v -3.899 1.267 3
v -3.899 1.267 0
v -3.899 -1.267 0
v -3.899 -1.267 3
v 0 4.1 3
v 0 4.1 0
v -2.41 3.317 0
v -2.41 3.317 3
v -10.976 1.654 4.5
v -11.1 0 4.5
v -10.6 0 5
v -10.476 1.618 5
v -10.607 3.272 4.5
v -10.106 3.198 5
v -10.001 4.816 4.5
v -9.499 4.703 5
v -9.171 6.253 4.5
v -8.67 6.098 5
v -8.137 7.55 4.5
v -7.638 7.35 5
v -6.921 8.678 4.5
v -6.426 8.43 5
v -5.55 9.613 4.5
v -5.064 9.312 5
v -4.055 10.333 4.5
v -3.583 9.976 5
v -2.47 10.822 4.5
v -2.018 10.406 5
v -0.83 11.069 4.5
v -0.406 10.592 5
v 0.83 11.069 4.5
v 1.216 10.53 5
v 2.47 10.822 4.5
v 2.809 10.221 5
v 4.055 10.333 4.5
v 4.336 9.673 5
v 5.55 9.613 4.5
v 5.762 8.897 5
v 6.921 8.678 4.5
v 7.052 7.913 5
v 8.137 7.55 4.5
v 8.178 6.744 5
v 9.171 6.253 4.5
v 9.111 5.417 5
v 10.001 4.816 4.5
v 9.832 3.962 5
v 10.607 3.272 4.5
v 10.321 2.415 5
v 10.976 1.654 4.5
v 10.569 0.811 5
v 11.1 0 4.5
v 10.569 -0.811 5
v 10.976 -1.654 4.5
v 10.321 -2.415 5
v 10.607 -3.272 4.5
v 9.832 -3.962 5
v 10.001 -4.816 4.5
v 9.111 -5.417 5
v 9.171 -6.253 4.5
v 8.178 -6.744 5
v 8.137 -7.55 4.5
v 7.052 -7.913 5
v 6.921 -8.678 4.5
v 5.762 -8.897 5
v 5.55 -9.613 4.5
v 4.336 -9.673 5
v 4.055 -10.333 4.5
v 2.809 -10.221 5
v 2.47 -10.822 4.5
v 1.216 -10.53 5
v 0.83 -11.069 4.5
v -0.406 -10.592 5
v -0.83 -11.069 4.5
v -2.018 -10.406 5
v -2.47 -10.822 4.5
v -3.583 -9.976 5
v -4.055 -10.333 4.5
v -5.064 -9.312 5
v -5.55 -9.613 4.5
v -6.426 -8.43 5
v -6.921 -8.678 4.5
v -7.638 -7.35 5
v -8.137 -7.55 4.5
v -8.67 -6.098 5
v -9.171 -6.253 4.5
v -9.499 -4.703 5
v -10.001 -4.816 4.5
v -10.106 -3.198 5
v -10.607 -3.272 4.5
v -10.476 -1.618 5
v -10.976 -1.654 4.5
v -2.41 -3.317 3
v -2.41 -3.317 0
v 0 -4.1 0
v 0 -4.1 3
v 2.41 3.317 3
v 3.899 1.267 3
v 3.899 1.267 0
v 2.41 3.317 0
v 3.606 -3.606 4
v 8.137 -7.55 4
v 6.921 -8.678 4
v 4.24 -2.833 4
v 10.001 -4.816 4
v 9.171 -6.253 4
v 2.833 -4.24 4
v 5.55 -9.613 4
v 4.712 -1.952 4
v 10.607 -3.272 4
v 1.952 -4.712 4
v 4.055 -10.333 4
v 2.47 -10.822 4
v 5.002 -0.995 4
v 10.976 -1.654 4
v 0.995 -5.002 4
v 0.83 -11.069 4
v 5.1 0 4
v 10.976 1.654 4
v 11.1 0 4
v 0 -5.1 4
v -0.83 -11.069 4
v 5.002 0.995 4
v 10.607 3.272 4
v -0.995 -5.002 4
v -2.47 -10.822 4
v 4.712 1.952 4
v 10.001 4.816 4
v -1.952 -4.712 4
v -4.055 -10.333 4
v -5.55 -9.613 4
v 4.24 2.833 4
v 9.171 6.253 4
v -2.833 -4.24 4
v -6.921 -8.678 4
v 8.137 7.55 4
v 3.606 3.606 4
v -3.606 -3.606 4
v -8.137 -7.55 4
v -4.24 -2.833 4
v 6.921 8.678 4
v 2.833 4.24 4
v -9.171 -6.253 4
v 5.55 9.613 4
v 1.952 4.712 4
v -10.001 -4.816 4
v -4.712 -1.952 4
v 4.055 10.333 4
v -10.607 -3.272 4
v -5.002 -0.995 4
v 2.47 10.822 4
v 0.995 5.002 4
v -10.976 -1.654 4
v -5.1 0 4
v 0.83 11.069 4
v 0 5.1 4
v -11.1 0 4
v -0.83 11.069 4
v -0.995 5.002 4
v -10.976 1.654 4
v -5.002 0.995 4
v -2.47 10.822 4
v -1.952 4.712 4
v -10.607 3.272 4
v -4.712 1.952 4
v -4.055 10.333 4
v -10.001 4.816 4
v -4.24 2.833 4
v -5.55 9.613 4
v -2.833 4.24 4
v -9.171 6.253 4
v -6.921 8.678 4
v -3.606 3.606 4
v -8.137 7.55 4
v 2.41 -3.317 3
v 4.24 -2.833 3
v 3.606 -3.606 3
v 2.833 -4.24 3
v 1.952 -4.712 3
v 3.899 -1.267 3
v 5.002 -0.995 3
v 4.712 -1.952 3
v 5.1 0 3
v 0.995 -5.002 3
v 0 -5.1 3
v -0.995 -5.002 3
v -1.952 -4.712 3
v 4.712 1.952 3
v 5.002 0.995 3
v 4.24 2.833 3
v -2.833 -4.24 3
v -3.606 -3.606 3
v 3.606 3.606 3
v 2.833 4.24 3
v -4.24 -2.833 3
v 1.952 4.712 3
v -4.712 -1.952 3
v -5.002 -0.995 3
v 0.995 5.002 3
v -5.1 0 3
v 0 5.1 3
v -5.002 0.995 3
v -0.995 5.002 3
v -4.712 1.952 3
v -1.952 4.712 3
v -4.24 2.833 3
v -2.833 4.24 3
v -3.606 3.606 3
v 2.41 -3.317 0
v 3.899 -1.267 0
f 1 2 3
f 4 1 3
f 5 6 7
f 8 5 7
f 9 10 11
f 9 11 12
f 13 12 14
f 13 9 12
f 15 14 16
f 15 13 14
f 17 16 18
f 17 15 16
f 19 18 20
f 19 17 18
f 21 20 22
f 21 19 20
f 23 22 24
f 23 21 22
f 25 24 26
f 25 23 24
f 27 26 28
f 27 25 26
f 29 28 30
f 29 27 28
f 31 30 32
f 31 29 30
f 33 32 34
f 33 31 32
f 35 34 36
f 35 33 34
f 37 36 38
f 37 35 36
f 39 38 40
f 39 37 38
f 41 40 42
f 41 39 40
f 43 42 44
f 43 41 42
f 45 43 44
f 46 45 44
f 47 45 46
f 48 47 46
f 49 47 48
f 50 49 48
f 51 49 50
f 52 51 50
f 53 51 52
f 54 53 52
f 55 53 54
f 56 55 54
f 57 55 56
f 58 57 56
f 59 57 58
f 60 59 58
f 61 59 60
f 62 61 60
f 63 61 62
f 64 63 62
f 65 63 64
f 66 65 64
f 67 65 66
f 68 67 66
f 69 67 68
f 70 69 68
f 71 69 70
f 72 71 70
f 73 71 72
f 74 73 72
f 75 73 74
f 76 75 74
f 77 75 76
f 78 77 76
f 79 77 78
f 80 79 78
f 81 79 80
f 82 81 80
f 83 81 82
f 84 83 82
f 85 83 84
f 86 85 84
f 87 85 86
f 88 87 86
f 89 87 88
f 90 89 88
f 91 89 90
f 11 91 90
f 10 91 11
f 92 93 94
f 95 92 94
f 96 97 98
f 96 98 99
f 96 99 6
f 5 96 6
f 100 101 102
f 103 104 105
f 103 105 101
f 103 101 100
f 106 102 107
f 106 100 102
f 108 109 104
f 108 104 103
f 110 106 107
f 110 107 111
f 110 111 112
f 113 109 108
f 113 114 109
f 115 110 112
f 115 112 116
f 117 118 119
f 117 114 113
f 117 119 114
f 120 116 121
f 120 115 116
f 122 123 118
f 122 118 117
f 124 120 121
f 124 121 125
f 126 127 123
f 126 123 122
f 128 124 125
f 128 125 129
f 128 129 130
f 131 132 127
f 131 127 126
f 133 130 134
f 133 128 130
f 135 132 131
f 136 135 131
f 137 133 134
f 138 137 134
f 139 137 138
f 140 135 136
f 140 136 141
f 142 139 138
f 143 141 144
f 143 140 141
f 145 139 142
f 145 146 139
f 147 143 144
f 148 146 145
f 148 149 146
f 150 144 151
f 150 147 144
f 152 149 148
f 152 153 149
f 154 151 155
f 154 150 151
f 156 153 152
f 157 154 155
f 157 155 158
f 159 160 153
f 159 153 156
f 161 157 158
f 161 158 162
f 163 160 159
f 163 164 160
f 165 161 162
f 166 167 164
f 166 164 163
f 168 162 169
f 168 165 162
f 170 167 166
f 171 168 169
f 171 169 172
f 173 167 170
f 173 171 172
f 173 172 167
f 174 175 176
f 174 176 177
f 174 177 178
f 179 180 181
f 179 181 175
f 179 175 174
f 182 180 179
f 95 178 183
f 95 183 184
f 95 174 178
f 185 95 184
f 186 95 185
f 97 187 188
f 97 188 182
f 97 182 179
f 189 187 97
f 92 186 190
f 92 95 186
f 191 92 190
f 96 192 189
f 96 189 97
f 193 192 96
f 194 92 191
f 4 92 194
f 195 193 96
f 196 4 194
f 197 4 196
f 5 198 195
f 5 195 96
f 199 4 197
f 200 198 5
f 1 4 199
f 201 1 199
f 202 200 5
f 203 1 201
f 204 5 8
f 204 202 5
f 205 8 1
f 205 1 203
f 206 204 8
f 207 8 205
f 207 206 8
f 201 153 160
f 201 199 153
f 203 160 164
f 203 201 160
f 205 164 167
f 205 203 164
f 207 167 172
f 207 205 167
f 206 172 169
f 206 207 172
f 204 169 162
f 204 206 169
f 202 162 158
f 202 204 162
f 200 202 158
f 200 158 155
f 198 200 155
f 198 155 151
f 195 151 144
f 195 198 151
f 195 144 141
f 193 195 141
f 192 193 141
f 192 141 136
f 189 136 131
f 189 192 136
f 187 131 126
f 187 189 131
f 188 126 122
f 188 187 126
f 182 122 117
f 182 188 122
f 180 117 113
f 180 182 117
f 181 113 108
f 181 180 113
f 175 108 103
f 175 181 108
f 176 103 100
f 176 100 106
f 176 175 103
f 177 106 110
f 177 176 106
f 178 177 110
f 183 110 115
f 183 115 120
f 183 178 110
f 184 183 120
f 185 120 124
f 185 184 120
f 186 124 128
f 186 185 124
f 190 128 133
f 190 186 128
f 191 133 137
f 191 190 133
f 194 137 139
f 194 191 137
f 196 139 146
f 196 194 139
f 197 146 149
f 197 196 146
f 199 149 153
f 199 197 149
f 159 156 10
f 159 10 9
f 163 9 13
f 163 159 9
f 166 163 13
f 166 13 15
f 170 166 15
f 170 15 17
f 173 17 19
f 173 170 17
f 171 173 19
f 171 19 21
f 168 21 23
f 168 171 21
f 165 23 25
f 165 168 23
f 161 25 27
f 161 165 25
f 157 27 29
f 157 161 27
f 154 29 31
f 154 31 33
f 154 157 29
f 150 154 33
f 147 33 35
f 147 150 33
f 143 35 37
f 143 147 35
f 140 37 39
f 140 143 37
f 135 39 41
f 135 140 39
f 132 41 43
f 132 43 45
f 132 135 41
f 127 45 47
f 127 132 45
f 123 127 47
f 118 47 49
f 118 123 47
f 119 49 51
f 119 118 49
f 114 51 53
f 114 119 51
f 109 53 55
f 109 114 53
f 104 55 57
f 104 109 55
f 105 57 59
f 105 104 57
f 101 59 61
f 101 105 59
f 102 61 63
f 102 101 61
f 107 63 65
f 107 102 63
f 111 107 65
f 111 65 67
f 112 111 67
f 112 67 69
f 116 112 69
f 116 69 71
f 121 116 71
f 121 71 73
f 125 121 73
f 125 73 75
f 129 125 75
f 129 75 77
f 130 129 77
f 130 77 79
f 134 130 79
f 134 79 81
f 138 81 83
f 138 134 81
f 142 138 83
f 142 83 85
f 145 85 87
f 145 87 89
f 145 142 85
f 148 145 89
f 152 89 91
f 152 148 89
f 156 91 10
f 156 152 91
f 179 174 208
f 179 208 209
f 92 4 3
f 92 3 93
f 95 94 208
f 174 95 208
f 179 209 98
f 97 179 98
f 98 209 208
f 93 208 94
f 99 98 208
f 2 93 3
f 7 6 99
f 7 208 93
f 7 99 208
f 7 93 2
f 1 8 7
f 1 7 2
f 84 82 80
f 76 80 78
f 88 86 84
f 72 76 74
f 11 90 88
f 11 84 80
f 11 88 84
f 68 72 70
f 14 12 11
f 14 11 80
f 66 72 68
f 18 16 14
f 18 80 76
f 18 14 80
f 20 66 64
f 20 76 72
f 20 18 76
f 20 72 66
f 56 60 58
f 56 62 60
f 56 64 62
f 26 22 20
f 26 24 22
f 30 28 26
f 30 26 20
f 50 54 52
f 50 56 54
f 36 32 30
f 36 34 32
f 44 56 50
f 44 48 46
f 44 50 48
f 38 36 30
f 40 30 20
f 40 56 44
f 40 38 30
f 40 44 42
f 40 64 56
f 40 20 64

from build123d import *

# Parameters (mm, degrees)
F2_SIZE  = 0.5
F4_DEPTH = 3


with BuildPart() as f1:
    # F0 (on Front) → F1 (revolve)
    with BuildSketch(Plane.XZ):
        Polygon((-4.1, 0), (0, 0), (0, 5), (-11.1, 5), (-11.1, 4), (-5.1, 4), (-5.1, 3), (-4.1, 3), align=None)
    revolve(axis=Axis((0, 0, 2.5), (0, 0, -1)))

    # F2
    f2_edges = [f1.edges().sort_by_distance(p)[0] for p in [
        (11.1, 0, 5),
    ]]
    chamfer(f2_edges, length=F2_SIZE)

    # F3 (on face) → F4 (cut)
    with BuildSketch(Plane(origin=(0, 0, 0), x_dir=(1, 0, 0), z_dir=(0, 0, -1))):
        with BuildLine():
            ThreePointArc((2.40992, 3.31697), (1.26697, 3.899332), (0, 4.1))
            Line((0, 4.1), (2.40992, 3.31697))
        make_face()
        with BuildLine():
            ThreePointArc((3.899332, 1.26697), (3.31697, 2.40992), (2.40992, 3.31697))
            Line((2.40992, 3.31697), (3.899332, 1.26697))
        make_face()
        with BuildLine():
            ThreePointArc((4.1, 0), (4.049522, 0.641381), (3.899332, 1.26697))
            Line((3.899332, 1.26697), (3.899332, -1.26697))
            ThreePointArc((3.899332, -1.26697), (4.049522, -0.641381), (4.1, 0))
        make_face()
        with BuildLine():
            ThreePointArc((2.40992, -3.31697), (3.31697, -2.40992), (3.899332, -1.26697))
            Line((3.899332, -1.26697), (2.40992, -3.31697))
        make_face()
        with BuildLine():
            ThreePointArc((0, -4.1), (1.26697, -3.899332), (2.40992, -3.31697))
            Line((2.40992, -3.31697), (0, -4.1))
        make_face()
        with BuildLine():
            Line((0, -4.1), (-2.40992, -3.31697))
            ThreePointArc((-2.40992, -3.31697), (-1.26697, -3.899332), (0, -4.1))
        make_face()
        with BuildLine():
            Line((-2.40992, -3.31697), (-3.899332, -1.26697))
            ThreePointArc((-3.899332, -1.26697), (-3.31697, -2.40992), (-2.40992, -3.31697))
        make_face()
        with BuildLine():
            Line((-3.899332, -1.26697), (-3.899332, 1.26697))
            ThreePointArc((-3.899332, 1.26697), (-4.1, 0), (-3.899332, -1.26697))
        make_face()
        with BuildLine():
            Line((-3.899332, 1.26697), (-2.40992, 3.31697))
            ThreePointArc((-2.40992, 3.31697), (-3.31697, 2.40992), (-3.899332, 1.26697))
        make_face()
        with BuildLine():
            Line((-2.40992, 3.31697), (0, 4.1))
            ThreePointArc((0, 4.1), (-1.26697, 3.899332), (-2.40992, 3.31697))
        make_face()
    extrude(amount=-F4_DEPTH, mode=Mode.SUBTRACT)


solid = f1.part
